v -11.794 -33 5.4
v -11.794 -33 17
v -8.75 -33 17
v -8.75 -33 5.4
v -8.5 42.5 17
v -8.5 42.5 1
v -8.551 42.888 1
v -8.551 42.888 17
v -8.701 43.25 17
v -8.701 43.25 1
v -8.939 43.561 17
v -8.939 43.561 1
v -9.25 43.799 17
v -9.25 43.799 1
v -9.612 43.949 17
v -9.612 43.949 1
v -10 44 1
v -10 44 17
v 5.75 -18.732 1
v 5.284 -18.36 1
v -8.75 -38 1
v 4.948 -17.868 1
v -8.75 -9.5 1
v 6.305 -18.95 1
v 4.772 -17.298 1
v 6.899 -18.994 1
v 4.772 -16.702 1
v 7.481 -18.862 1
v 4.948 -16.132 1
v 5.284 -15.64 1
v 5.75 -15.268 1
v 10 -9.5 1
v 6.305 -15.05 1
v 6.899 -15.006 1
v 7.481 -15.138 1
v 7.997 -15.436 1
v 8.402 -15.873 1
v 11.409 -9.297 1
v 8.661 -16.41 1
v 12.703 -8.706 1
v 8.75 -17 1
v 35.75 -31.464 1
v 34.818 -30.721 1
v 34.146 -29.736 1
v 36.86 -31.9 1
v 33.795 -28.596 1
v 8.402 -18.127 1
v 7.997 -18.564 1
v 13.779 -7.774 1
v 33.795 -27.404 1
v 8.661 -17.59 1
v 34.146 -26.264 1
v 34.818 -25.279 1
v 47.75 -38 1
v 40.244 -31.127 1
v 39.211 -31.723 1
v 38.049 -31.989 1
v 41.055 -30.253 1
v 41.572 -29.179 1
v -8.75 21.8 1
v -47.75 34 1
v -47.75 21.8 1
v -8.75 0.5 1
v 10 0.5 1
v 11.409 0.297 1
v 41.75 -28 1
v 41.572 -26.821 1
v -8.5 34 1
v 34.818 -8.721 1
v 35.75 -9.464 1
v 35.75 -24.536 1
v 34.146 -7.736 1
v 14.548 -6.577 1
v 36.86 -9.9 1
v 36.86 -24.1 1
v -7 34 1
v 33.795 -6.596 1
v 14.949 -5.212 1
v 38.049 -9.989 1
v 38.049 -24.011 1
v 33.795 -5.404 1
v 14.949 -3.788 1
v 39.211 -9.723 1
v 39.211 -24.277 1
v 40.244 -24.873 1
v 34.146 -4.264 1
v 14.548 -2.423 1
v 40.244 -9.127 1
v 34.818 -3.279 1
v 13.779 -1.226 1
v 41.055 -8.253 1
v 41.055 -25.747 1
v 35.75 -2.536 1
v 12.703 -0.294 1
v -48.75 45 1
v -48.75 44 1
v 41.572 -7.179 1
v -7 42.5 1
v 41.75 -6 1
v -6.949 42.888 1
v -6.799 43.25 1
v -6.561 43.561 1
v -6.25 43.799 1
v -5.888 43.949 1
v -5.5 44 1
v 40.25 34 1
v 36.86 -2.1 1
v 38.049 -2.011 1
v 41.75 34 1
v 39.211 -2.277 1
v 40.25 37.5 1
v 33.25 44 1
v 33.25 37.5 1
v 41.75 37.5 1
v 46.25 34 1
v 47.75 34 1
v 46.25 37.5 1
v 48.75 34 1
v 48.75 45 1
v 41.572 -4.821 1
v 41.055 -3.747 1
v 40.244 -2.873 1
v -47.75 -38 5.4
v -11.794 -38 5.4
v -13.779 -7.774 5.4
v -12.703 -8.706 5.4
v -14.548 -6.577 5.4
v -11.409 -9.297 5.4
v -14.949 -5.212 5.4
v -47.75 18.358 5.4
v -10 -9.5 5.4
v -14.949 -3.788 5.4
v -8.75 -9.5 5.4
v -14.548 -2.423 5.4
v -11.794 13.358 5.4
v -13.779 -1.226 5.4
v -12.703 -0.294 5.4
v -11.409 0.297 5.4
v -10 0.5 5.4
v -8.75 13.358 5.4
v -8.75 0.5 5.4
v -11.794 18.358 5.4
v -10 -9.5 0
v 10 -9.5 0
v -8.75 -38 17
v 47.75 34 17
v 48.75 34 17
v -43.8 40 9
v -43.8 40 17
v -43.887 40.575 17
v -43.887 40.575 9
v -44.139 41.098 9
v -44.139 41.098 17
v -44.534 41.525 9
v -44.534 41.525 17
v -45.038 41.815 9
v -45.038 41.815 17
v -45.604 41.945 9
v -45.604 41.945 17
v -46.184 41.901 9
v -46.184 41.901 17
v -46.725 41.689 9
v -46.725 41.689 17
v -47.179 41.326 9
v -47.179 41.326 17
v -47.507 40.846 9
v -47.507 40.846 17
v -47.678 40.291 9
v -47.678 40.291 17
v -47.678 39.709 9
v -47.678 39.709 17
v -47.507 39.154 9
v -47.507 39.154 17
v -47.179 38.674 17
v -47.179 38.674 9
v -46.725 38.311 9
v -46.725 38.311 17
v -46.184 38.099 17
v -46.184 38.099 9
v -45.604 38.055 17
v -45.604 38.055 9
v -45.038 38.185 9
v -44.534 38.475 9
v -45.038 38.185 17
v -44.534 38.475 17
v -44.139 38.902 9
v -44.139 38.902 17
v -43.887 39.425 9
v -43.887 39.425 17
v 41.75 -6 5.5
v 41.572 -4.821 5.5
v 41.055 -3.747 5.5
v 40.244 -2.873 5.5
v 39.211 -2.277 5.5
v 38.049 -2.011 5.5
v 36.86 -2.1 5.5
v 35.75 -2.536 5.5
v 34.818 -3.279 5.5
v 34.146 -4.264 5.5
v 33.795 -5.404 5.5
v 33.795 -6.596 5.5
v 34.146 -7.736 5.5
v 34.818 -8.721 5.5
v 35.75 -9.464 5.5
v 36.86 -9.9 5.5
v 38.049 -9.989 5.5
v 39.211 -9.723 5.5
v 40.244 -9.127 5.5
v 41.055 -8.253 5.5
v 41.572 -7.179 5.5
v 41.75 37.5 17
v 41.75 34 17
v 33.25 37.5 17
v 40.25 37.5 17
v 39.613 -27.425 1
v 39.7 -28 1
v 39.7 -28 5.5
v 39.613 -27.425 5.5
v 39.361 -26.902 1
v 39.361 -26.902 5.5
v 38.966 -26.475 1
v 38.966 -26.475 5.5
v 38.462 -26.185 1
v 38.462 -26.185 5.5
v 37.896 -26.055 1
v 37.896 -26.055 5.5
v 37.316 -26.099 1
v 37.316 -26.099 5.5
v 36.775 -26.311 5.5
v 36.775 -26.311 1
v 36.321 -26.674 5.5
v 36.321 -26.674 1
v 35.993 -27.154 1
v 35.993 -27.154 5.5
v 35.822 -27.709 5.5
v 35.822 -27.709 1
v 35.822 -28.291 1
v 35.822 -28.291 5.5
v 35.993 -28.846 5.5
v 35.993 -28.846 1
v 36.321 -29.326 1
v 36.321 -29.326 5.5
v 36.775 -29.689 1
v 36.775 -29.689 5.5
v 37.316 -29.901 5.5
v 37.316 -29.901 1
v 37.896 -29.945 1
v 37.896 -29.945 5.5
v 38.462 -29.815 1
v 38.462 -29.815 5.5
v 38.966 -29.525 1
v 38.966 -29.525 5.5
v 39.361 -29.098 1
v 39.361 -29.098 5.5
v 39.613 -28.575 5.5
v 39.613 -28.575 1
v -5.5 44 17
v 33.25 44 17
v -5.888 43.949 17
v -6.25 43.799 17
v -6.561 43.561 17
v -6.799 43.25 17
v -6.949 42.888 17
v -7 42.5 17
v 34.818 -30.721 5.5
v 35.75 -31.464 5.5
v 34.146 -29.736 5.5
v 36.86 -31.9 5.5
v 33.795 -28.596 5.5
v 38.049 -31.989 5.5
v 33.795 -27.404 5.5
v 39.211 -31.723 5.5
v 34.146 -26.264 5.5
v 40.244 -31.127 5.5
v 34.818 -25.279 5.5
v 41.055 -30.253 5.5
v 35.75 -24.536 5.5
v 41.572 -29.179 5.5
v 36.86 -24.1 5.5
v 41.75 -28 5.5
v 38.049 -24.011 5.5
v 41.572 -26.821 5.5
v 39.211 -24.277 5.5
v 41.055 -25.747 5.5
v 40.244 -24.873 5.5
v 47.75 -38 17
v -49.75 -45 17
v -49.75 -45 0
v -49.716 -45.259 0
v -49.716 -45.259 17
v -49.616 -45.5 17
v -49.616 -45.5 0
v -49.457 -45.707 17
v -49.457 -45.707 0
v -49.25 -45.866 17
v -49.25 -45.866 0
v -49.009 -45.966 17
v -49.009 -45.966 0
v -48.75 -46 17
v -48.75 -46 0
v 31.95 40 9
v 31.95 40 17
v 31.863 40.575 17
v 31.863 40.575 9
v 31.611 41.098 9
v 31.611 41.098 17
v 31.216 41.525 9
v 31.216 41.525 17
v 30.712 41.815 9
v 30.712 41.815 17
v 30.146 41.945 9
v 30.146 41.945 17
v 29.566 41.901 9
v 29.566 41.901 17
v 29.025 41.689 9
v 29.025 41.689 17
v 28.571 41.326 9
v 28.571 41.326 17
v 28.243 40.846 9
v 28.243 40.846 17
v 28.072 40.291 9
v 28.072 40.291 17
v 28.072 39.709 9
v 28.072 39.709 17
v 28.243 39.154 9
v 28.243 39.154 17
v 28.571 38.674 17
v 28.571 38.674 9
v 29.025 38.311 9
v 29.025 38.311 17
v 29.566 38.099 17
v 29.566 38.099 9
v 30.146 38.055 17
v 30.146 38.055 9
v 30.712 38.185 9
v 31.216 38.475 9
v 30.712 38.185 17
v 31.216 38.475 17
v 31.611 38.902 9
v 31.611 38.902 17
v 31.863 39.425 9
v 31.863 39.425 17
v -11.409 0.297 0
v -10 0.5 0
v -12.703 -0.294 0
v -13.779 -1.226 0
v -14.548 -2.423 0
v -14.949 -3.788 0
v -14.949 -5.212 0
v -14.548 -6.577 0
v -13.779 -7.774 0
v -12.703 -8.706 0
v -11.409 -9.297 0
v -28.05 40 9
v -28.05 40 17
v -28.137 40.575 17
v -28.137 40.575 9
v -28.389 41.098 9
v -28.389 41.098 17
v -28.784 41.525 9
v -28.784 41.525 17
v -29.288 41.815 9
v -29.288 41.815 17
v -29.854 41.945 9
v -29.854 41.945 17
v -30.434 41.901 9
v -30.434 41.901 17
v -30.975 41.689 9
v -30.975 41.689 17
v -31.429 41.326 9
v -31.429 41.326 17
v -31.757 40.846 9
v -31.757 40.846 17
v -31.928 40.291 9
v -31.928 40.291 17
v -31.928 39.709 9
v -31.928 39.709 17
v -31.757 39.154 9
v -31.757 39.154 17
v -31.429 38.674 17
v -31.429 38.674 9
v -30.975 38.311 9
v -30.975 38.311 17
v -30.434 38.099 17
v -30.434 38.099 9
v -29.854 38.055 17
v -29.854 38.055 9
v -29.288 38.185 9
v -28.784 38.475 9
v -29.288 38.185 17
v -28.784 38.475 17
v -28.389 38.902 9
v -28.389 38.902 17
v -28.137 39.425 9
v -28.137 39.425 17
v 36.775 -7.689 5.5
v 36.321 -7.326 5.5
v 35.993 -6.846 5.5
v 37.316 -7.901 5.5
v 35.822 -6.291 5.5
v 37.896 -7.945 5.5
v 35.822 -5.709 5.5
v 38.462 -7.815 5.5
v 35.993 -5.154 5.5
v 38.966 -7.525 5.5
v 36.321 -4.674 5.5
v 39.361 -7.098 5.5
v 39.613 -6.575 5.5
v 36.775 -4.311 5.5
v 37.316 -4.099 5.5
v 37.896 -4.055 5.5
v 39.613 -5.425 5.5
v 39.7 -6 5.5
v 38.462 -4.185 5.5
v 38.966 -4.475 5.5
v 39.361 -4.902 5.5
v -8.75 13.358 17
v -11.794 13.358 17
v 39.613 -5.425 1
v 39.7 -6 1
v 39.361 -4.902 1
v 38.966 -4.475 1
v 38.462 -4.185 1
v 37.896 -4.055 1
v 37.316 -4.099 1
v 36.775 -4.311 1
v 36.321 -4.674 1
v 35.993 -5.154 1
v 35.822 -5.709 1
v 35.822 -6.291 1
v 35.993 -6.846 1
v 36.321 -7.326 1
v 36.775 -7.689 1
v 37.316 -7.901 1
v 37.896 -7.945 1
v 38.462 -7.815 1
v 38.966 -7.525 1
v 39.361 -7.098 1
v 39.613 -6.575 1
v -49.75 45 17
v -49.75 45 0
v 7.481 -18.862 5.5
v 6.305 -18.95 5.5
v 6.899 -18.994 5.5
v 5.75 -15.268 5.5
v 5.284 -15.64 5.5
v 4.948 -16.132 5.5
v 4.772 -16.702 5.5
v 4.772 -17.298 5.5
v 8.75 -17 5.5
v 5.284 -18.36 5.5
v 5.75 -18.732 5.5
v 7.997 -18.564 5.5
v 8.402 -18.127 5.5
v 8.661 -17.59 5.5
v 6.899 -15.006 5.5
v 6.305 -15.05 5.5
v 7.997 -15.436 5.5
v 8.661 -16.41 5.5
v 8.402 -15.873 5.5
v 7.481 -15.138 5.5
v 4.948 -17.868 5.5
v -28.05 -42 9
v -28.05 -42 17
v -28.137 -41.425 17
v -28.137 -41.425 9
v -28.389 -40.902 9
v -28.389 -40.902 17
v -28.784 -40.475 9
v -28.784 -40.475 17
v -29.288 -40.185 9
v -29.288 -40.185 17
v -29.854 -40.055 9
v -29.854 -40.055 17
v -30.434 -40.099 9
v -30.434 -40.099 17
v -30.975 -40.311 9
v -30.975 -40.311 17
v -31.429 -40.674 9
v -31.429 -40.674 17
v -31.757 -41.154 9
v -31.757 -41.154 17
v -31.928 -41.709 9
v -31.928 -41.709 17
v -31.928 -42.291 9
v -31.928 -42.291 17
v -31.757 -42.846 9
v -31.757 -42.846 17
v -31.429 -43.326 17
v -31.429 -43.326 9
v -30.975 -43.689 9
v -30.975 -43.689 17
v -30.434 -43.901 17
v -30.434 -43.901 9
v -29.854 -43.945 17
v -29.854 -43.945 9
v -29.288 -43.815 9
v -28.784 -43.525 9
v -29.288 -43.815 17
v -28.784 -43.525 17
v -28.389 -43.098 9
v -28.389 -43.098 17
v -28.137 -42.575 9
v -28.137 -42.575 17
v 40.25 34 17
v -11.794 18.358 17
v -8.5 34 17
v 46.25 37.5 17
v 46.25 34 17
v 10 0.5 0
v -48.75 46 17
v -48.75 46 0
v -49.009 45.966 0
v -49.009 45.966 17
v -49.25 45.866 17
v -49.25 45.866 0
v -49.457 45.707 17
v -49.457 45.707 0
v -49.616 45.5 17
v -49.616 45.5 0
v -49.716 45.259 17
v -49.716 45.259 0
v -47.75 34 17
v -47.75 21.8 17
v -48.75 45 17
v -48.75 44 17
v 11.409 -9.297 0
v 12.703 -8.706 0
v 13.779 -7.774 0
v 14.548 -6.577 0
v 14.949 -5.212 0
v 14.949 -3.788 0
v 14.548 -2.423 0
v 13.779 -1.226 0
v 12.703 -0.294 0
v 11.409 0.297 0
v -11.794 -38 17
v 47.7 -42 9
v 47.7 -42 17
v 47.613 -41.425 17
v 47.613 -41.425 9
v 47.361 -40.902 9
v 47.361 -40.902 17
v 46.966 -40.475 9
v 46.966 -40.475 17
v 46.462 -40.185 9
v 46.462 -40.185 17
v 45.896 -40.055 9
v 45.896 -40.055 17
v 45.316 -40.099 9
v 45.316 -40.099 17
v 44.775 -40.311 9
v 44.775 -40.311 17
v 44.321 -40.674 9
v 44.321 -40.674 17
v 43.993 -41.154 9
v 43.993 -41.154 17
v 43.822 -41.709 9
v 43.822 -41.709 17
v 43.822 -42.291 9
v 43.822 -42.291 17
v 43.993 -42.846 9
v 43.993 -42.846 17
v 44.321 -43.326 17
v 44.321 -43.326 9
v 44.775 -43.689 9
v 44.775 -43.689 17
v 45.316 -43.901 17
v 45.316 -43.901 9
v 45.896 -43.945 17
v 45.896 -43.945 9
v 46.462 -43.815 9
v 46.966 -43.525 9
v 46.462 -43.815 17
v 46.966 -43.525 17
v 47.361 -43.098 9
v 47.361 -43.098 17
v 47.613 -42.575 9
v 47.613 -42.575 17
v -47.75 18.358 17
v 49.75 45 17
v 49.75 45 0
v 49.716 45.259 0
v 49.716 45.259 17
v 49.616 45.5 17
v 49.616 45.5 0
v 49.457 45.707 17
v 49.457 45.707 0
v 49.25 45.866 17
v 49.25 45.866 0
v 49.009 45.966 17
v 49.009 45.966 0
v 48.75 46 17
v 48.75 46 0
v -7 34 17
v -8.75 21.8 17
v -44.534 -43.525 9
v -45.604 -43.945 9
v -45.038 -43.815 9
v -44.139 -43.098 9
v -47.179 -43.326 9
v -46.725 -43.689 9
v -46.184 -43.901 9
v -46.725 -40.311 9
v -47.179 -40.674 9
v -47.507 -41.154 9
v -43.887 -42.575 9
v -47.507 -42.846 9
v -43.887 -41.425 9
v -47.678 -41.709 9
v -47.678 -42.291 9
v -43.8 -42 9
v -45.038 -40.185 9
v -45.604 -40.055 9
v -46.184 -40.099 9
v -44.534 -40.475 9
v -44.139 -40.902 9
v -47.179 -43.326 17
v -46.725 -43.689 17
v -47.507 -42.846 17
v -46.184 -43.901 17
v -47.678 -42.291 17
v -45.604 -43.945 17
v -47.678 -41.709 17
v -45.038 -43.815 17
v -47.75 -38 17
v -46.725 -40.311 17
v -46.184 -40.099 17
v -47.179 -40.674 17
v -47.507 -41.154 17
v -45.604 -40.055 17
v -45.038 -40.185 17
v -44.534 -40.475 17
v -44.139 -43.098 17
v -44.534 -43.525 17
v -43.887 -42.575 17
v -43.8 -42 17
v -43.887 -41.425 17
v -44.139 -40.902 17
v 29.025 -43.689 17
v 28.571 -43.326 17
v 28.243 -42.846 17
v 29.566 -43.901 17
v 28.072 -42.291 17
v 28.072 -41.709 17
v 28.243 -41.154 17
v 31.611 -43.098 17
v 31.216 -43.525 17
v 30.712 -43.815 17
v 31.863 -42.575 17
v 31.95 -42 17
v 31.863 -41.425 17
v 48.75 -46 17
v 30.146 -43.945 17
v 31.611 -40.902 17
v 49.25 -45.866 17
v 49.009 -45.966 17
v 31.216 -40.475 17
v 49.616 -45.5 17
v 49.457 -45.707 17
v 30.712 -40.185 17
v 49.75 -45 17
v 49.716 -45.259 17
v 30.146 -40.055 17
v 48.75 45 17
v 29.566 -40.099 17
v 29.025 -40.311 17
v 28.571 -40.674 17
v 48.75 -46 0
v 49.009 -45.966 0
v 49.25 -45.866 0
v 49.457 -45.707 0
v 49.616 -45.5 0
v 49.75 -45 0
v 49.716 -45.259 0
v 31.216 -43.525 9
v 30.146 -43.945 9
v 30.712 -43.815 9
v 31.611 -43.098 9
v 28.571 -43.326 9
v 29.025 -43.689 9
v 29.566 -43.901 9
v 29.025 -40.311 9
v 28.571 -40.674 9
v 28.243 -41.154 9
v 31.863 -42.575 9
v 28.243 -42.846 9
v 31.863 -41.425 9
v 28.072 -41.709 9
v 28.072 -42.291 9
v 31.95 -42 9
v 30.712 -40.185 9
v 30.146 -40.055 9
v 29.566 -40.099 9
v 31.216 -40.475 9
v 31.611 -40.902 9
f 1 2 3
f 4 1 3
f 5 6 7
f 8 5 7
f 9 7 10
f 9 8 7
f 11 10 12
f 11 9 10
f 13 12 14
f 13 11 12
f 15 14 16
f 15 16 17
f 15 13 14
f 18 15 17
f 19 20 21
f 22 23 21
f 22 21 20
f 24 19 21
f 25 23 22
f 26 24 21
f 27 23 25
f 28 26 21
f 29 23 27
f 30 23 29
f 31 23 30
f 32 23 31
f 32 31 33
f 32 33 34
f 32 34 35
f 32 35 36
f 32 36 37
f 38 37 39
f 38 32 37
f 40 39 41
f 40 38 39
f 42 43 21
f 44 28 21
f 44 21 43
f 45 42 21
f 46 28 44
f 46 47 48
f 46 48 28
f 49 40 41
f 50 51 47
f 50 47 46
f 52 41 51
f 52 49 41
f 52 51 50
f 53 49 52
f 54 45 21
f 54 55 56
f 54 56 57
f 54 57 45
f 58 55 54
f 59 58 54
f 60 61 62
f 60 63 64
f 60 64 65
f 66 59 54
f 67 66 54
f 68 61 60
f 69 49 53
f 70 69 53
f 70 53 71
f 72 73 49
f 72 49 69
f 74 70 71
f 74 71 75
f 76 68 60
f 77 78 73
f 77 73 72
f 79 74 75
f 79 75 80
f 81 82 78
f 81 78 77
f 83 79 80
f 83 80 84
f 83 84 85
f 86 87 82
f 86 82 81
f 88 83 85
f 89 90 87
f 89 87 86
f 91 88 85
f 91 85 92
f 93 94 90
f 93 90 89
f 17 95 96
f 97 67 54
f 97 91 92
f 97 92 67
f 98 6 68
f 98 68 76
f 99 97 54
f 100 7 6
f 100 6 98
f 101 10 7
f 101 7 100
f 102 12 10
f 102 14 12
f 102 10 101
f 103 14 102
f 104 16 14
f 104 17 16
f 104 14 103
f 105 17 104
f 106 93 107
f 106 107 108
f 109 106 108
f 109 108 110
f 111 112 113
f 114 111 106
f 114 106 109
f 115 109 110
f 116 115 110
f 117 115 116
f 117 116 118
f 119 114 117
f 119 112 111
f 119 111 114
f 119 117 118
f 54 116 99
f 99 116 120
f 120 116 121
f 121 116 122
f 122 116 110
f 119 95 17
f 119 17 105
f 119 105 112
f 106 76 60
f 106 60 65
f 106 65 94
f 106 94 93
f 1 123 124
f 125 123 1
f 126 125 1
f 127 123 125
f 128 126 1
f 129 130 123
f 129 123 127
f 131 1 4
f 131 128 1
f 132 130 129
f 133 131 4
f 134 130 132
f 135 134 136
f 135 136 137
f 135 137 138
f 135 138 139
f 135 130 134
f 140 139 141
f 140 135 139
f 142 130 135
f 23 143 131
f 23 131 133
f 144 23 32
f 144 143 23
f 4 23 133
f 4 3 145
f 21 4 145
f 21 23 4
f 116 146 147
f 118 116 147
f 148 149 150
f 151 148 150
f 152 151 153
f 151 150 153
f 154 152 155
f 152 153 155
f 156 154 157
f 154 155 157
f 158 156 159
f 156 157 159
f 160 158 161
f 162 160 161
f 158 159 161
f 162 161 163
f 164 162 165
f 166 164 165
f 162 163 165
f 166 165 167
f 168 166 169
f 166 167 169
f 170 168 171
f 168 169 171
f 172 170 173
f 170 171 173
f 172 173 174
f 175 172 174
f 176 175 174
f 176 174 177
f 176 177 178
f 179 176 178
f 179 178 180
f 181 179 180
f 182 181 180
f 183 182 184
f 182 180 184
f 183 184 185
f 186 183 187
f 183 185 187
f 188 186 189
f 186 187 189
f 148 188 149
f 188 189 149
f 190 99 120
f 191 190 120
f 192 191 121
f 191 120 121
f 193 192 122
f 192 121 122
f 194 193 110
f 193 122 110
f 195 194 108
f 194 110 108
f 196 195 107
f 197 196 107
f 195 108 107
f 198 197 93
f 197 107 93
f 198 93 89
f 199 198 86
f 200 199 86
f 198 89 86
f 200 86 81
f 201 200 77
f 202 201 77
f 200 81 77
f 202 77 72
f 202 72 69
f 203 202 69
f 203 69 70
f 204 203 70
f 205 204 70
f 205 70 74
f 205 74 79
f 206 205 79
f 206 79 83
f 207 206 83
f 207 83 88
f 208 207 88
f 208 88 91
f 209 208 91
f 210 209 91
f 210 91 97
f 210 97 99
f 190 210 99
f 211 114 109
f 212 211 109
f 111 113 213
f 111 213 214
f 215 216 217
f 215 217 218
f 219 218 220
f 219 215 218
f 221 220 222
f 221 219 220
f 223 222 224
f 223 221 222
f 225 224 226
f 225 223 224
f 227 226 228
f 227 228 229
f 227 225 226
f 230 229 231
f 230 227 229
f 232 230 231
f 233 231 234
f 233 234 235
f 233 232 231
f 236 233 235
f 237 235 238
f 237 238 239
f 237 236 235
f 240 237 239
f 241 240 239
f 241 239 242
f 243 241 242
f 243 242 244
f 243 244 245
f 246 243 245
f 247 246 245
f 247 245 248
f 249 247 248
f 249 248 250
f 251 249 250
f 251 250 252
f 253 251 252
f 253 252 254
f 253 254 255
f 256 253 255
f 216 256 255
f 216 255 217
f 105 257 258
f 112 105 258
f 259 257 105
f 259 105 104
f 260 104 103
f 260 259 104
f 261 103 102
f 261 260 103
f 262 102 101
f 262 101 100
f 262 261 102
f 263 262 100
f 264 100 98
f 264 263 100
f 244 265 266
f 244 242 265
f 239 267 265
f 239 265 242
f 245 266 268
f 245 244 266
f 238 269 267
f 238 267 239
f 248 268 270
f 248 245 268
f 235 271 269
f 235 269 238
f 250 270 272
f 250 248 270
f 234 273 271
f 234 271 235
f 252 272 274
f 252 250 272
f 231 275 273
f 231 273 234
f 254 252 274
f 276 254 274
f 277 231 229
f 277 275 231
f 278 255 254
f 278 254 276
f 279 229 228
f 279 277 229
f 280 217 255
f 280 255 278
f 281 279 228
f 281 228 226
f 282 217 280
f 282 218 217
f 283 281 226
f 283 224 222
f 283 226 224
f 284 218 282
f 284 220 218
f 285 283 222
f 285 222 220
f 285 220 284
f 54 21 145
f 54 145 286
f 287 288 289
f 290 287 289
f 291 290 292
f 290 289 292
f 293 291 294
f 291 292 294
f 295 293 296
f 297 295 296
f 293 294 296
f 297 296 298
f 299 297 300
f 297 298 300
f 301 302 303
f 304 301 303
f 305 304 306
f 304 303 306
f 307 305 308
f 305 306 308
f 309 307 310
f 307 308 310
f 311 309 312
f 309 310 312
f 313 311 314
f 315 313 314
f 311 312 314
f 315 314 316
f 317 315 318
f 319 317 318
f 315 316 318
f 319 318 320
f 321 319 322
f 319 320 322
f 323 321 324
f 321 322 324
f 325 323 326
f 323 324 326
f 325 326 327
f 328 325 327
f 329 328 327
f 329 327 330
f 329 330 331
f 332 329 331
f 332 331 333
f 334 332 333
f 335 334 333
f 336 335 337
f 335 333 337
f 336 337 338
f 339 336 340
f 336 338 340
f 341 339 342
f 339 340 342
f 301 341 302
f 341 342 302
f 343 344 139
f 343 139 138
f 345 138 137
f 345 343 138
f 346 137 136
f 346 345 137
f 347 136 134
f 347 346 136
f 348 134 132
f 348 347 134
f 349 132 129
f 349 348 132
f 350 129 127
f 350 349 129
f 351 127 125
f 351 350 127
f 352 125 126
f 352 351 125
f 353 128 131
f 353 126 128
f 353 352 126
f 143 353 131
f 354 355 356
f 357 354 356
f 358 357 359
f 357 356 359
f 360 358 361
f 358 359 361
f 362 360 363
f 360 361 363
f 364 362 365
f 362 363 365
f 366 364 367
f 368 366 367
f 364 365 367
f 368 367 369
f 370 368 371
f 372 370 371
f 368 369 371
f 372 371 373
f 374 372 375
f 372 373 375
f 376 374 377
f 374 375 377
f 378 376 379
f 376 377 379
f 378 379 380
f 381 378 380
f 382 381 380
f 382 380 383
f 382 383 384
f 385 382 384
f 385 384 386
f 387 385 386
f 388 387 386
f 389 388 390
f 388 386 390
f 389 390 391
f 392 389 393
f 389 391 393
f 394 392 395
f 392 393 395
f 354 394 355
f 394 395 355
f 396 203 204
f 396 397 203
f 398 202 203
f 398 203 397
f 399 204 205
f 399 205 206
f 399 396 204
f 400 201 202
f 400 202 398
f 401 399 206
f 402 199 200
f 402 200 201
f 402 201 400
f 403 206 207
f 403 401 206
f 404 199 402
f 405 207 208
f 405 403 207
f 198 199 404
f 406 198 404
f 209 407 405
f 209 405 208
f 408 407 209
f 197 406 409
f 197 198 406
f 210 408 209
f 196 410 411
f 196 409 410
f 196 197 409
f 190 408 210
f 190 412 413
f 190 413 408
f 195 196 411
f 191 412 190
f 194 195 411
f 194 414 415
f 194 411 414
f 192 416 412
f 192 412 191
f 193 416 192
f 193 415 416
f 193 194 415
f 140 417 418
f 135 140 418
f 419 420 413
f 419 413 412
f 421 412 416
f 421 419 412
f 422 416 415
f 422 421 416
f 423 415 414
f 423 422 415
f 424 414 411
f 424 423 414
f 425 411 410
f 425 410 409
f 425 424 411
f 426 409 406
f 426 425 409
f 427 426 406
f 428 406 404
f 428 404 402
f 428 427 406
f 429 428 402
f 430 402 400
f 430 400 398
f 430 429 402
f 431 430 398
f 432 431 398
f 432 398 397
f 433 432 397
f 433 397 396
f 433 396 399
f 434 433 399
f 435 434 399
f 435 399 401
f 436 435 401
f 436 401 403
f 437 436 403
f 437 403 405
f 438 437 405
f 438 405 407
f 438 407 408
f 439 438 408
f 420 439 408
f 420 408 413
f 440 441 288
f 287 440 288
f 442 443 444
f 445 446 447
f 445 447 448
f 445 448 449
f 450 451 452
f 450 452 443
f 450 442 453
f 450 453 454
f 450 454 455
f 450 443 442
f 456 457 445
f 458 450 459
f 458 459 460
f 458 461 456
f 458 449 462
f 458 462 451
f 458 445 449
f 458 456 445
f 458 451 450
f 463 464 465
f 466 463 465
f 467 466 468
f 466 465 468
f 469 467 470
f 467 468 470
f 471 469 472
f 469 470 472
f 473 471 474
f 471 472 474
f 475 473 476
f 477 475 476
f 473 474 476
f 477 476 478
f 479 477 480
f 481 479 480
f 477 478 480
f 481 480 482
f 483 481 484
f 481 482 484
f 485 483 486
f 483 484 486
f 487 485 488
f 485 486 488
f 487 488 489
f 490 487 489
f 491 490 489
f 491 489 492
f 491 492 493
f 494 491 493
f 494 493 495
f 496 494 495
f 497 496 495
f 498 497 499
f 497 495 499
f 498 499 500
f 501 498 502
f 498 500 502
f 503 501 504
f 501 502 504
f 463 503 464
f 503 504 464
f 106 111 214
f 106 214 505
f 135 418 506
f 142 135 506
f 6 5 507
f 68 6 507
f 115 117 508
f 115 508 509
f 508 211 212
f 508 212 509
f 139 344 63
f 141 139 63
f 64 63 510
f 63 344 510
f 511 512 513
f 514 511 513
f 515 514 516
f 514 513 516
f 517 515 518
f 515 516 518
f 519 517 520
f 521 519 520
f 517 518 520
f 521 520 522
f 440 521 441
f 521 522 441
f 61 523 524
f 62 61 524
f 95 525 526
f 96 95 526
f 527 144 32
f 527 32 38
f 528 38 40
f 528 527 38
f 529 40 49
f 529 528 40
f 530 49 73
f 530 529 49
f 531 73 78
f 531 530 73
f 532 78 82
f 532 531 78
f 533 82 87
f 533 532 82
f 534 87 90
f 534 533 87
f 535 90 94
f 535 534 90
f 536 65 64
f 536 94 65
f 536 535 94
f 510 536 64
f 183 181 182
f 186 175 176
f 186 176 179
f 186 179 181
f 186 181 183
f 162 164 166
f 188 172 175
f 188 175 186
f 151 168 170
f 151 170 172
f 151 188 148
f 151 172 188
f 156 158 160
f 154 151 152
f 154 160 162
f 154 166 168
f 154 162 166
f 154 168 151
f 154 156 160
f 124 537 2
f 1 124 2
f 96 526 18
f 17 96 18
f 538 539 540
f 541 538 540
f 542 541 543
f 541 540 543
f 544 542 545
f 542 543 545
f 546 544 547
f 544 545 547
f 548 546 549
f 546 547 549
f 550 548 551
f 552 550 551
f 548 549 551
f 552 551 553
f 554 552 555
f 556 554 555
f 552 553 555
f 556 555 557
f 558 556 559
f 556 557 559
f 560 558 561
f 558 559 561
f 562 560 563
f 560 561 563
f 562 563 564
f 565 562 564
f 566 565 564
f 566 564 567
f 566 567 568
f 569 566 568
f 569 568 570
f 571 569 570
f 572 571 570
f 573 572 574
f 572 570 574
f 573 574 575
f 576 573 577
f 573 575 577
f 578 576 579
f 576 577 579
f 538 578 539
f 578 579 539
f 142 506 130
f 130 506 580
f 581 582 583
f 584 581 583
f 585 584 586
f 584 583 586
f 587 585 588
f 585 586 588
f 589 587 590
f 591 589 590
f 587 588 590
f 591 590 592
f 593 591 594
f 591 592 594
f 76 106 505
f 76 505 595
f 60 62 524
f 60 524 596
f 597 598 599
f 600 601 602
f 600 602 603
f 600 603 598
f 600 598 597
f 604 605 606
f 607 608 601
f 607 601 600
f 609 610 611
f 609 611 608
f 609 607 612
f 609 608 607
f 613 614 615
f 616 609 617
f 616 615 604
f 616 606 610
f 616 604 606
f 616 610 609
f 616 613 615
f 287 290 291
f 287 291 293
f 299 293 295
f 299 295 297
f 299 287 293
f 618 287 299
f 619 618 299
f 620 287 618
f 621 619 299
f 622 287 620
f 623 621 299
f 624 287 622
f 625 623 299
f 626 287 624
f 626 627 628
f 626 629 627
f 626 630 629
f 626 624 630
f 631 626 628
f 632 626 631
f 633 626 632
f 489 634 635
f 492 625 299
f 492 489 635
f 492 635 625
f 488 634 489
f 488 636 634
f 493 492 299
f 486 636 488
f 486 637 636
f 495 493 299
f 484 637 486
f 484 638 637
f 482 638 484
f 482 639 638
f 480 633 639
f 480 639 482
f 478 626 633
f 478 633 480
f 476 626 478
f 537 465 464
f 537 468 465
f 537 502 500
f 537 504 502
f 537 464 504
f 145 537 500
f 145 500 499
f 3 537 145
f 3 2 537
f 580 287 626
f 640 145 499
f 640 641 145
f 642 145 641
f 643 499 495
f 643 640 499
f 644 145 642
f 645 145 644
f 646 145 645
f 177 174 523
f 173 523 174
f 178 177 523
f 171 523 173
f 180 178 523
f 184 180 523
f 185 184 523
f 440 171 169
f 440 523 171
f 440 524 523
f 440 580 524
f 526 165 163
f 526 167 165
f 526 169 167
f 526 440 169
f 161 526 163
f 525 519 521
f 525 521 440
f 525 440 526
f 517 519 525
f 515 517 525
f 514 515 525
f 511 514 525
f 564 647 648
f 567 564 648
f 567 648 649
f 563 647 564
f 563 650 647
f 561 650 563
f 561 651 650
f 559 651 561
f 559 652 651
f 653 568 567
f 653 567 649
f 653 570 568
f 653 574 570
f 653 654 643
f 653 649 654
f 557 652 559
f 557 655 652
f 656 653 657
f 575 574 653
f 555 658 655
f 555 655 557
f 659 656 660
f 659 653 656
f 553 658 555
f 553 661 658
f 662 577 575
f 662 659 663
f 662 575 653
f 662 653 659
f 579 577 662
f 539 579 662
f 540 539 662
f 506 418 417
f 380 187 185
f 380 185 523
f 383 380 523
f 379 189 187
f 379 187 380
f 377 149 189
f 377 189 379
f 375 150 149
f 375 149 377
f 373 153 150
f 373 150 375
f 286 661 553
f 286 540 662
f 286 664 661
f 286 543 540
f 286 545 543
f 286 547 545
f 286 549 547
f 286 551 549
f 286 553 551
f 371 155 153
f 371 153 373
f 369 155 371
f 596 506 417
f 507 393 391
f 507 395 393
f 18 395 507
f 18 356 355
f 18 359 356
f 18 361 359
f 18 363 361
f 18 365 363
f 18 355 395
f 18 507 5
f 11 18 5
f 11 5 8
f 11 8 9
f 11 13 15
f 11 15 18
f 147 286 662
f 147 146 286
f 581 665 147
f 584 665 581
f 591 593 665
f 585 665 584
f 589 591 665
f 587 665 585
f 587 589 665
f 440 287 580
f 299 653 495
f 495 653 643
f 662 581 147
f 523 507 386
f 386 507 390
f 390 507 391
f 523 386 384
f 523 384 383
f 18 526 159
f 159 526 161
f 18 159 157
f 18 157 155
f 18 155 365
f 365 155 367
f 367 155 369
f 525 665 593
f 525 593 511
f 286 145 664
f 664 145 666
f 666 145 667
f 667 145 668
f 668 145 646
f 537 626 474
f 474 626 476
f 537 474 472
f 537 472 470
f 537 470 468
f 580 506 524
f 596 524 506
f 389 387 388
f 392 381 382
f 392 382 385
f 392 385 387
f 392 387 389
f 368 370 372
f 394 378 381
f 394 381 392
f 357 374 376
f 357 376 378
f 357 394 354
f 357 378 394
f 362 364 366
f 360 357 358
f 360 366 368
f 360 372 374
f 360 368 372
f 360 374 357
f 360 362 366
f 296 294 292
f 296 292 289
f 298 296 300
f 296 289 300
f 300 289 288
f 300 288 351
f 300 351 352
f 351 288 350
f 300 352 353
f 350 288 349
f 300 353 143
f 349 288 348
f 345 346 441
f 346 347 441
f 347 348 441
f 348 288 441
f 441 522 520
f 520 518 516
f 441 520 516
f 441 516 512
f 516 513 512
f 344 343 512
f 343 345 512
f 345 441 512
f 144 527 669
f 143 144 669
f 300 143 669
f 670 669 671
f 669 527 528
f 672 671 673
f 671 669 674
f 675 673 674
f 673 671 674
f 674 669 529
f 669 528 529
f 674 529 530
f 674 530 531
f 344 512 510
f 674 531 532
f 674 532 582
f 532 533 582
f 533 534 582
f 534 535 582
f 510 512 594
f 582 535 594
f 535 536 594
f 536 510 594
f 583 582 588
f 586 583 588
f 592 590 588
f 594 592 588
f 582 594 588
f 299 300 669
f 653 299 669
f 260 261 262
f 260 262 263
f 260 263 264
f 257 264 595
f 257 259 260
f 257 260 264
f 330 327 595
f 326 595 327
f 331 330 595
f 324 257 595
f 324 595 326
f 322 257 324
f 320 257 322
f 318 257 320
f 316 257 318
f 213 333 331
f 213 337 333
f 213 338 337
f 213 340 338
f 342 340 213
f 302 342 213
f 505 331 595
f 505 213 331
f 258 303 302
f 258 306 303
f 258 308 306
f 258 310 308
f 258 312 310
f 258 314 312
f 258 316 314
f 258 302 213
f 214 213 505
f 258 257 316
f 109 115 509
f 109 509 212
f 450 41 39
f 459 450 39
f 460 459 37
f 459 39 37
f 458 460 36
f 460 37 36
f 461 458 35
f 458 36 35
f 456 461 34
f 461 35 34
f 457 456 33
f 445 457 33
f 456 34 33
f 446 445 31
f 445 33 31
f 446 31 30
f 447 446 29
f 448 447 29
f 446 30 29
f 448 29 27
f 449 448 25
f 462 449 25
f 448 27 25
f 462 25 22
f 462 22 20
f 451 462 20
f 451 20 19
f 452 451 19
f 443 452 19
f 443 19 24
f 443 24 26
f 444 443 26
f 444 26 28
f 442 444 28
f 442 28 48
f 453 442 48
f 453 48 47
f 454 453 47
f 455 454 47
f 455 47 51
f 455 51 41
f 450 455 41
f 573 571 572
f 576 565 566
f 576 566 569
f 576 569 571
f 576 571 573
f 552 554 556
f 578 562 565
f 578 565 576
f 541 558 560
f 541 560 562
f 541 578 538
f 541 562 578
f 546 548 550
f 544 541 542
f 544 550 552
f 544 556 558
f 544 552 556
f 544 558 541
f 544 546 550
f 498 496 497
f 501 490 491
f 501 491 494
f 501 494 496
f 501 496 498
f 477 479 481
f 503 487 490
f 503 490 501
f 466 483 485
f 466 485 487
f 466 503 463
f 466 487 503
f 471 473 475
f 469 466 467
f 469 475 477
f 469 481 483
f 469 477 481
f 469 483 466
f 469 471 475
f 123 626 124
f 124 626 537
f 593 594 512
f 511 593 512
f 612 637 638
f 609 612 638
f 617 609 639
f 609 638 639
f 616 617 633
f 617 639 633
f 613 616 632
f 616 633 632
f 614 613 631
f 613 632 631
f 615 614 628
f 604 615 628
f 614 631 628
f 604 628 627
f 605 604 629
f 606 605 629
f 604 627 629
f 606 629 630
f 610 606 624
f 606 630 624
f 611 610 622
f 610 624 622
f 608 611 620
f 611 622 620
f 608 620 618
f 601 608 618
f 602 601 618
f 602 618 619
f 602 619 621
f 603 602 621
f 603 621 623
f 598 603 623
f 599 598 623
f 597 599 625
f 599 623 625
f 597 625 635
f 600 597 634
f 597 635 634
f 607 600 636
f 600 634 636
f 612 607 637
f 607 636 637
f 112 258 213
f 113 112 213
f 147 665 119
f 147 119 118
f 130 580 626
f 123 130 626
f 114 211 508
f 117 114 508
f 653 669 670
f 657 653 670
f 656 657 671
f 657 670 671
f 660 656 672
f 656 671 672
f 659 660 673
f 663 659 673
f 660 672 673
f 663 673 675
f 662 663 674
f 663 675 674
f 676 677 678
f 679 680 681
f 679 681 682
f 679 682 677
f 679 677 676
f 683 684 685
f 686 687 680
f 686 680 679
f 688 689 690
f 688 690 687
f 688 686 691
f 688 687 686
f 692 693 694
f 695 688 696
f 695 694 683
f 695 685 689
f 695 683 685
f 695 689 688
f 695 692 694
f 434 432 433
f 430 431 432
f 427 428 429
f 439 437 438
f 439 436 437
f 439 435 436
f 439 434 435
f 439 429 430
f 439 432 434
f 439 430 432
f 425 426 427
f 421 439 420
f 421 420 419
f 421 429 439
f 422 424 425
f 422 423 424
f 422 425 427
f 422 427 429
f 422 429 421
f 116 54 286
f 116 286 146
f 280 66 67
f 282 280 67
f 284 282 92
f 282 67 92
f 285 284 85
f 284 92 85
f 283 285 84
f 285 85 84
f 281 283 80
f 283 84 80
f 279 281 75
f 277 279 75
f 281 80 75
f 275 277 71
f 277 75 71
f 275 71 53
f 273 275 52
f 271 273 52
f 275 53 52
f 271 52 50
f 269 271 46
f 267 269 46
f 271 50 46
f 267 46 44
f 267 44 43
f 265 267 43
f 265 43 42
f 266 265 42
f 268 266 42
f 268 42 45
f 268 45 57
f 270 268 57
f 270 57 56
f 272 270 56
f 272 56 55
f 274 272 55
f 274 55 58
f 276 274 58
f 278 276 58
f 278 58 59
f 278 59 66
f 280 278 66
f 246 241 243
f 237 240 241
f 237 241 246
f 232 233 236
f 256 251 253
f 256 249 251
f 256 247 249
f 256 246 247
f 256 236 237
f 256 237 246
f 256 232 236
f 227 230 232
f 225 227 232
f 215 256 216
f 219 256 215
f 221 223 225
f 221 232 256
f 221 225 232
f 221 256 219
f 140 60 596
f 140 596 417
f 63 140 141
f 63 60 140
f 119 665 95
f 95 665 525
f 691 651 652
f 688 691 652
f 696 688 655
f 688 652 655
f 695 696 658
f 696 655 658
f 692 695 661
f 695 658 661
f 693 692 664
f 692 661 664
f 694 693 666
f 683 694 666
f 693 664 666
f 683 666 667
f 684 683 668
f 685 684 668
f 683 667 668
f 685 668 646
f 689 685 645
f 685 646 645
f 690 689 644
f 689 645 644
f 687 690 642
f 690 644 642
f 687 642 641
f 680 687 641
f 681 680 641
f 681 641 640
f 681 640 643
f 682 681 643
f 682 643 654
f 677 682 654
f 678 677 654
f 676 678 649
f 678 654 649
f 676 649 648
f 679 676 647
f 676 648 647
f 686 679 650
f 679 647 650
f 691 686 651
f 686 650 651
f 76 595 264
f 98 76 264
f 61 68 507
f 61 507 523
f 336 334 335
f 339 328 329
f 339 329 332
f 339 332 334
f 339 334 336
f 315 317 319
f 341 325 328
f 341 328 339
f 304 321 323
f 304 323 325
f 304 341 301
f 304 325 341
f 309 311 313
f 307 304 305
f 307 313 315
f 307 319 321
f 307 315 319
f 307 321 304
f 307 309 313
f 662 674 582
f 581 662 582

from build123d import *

# Parameters (mm, degrees)
PAD033_DEPTH    = 1
PAD034_DEPTH    = 17
POCKET020_DEPTH = 16
POCKET021_DEPTH = 11.6
SKETCH057_R     = 4
SKETCH057_R_2   = 1.95
SKETCH057_R_3   = 2
PAD035_DEPTH    = 5.5
SKETCH058_R     = 1.95
POCKET022_DEPTH = 8
POCKET023_DEPTH = 17


with BuildPart() as part:
    # Sketch053 → Pad033 (new body)
    with BuildSketch(Plane.XY):
        with BuildLine():
            Line((-49.75, 45), (-49.75, -45))
            ThreePointArc((-49.75, -45), (-49.457107, -45.707107), (-48.75, -46))
            Line((-48.75, -46), (48.75, -46))
            ThreePointArc((48.75, -46), (49.457107, -45.707107), (49.75, -45))
            Line((49.75, -45), (49.75, 45))
            ThreePointArc((49.75, 45), (49.457107, 45.707107), (48.75, 46))
            Line((48.75, 46), (-48.75, 46))
            ThreePointArc((-48.75, 46), (-49.457107, 45.707107), (-49.75, 45))
        make_face()
    extrude(amount=PAD033_DEPTH)

    # Sketch054 → Pad034 (join)
    with BuildSketch(Plane.XY):
        with BuildLine():
            Line((-49.75, 45), (-49.75, -45))
            ThreePointArc((-49.75, -45), (-49.457107, -45.707107), (-48.75, -46))
            Line((-48.75, -46), (48.75, -46))
            ThreePointArc((48.75, -46), (49.457107, -45.707107), (49.75, -45))
            Line((49.75, -45), (49.75, 45))
            ThreePointArc((49.75, 45), (49.457107, 45.707107), (48.75, 46))
            Line((48.75, 46), (-48.75, 46))
            ThreePointArc((-48.75, 46), (-49.457107, 45.707107), (-49.75, 45))
        make_face()
        Polygon((-47.75, 34), (-47.75, 21.8), (-8.75, 21.8), (-8.75, -38), (47.75, -38), (47.75, 34), align=None, mode=Mode.SUBTRACT)
    extrude(amount=PAD034_DEPTH)

    # Sketch055 (on Face14 of Pad034) → Pocket020 (cut)
    with BuildSketch(Plane.XY.offset(17)):
        with BuildLine():
            Line((-48.75, 45), (-48.75, 44))
            Line((-48.75, 44), (-10, 44))
            ThreePointArc((-8.5, 42.5), (-8.93934, 43.56066), (-10, 44))
            Line((-8.5, 42.5), (-8.5, 34))
            Line((-8.5, 34), (-7, 34))
            Line((-7, 34), (-7, 42.5))
            ThreePointArc((-5.5, 44), (-6.56066, 43.56066), (-7, 42.5))
            Line((-5.5, 44), (33.25, 44))
            Line((33.25, 44), (33.25, 37.5))
            Line((33.25, 37.5), (40.25, 37.5))
            Line((40.25, 37.5), (40.25, 34))
            Line((41.75, 34), (40.25, 34))
            Line((41.75, 37.5), (41.75, 34))
            Line((41.75, 37.5), (46.25, 37.5))
            Line((46.25, 37.5), (46.25, 34))
            Line((46.25, 34), (48.75, 34))
            Line((48.75, 45), (48.75, 34))
            Line((48.75, 45), (-48.75, 45))
        make_face()
    extrude(amount=-POCKET020_DEPTH, mode=Mode.SUBTRACT)

    # Sketch056 (on Face14 of Pocket020) → Pocket021 (cut)
    with BuildSketch(Plane.XY.offset(17)):
        Polygon((-11.794, 18.358), (-47.75, 18.358), (-47.75, -38), (-11.794, -38), (-11.794, -33), (-8.75, -33), (-8.75, 13.358), (-11.794, 13.358), align=None)
    extrude(amount=-POCKET021_DEPTH, mode=Mode.SUBTRACT)

    # Sketch057 → Pad035 (join)
    with BuildSketch(Plane.XY):
        with Locations((37.75, -6)):
            Circle(SKETCH057_R)
        with Locations((37.75, -6)):
            Circle(SKETCH057_R_2, mode=Mode.SUBTRACT)
        with Locations((37.75, -28)):
            Circle(SKETCH057_R)
        with Locations((37.75, -28)):
            Circle(SKETCH057_R_2, mode=Mode.SUBTRACT)
        with Locations((6.75, -17)):
            Circle(SKETCH057_R_3)
    extrude(amount=PAD035_DEPTH)

    # Sketch058 (on Face14 of Pad035) → Pocket022 (cut)
    with BuildSketch(Plane.XY.offset(17)):
        with Locations((-45.75, -42)):
            Circle(SKETCH058_R)
        with Locations((-30, -42)):
            Circle(SKETCH058_R)
        with Locations((30, -42)):
            Circle(SKETCH058_R)
        with Locations((-45.75, 40)):
            Circle(SKETCH058_R)
        with Locations((-30, 40)):
            Circle(SKETCH058_R)
        with Locations((30, 40)):
            Circle(SKETCH058_R)
        with Locations((45.75, -42)):
            Circle(SKETCH058_R)
    extrude(amount=-POCKET022_DEPTH, mode=Mode.SUBTRACT)

    # Sketch060 → Pocket023 (cut)
    with BuildSketch(Plane.XY):
        with BuildLine():
            ThreePointArc((-10, 0.5), (-15, -4.5), (-10, -9.5))
            Line((-10, -9.5), (10, -9.5))
            ThreePointArc((10, -9.5), (15, -4.5), (10, 0.5))
            Line((-10, 0.5), (10, 0.5))
        make_face()
    extrude(amount=POCKET023_DEPTH, mode=Mode.SUBTRACT)


solid = part.part
